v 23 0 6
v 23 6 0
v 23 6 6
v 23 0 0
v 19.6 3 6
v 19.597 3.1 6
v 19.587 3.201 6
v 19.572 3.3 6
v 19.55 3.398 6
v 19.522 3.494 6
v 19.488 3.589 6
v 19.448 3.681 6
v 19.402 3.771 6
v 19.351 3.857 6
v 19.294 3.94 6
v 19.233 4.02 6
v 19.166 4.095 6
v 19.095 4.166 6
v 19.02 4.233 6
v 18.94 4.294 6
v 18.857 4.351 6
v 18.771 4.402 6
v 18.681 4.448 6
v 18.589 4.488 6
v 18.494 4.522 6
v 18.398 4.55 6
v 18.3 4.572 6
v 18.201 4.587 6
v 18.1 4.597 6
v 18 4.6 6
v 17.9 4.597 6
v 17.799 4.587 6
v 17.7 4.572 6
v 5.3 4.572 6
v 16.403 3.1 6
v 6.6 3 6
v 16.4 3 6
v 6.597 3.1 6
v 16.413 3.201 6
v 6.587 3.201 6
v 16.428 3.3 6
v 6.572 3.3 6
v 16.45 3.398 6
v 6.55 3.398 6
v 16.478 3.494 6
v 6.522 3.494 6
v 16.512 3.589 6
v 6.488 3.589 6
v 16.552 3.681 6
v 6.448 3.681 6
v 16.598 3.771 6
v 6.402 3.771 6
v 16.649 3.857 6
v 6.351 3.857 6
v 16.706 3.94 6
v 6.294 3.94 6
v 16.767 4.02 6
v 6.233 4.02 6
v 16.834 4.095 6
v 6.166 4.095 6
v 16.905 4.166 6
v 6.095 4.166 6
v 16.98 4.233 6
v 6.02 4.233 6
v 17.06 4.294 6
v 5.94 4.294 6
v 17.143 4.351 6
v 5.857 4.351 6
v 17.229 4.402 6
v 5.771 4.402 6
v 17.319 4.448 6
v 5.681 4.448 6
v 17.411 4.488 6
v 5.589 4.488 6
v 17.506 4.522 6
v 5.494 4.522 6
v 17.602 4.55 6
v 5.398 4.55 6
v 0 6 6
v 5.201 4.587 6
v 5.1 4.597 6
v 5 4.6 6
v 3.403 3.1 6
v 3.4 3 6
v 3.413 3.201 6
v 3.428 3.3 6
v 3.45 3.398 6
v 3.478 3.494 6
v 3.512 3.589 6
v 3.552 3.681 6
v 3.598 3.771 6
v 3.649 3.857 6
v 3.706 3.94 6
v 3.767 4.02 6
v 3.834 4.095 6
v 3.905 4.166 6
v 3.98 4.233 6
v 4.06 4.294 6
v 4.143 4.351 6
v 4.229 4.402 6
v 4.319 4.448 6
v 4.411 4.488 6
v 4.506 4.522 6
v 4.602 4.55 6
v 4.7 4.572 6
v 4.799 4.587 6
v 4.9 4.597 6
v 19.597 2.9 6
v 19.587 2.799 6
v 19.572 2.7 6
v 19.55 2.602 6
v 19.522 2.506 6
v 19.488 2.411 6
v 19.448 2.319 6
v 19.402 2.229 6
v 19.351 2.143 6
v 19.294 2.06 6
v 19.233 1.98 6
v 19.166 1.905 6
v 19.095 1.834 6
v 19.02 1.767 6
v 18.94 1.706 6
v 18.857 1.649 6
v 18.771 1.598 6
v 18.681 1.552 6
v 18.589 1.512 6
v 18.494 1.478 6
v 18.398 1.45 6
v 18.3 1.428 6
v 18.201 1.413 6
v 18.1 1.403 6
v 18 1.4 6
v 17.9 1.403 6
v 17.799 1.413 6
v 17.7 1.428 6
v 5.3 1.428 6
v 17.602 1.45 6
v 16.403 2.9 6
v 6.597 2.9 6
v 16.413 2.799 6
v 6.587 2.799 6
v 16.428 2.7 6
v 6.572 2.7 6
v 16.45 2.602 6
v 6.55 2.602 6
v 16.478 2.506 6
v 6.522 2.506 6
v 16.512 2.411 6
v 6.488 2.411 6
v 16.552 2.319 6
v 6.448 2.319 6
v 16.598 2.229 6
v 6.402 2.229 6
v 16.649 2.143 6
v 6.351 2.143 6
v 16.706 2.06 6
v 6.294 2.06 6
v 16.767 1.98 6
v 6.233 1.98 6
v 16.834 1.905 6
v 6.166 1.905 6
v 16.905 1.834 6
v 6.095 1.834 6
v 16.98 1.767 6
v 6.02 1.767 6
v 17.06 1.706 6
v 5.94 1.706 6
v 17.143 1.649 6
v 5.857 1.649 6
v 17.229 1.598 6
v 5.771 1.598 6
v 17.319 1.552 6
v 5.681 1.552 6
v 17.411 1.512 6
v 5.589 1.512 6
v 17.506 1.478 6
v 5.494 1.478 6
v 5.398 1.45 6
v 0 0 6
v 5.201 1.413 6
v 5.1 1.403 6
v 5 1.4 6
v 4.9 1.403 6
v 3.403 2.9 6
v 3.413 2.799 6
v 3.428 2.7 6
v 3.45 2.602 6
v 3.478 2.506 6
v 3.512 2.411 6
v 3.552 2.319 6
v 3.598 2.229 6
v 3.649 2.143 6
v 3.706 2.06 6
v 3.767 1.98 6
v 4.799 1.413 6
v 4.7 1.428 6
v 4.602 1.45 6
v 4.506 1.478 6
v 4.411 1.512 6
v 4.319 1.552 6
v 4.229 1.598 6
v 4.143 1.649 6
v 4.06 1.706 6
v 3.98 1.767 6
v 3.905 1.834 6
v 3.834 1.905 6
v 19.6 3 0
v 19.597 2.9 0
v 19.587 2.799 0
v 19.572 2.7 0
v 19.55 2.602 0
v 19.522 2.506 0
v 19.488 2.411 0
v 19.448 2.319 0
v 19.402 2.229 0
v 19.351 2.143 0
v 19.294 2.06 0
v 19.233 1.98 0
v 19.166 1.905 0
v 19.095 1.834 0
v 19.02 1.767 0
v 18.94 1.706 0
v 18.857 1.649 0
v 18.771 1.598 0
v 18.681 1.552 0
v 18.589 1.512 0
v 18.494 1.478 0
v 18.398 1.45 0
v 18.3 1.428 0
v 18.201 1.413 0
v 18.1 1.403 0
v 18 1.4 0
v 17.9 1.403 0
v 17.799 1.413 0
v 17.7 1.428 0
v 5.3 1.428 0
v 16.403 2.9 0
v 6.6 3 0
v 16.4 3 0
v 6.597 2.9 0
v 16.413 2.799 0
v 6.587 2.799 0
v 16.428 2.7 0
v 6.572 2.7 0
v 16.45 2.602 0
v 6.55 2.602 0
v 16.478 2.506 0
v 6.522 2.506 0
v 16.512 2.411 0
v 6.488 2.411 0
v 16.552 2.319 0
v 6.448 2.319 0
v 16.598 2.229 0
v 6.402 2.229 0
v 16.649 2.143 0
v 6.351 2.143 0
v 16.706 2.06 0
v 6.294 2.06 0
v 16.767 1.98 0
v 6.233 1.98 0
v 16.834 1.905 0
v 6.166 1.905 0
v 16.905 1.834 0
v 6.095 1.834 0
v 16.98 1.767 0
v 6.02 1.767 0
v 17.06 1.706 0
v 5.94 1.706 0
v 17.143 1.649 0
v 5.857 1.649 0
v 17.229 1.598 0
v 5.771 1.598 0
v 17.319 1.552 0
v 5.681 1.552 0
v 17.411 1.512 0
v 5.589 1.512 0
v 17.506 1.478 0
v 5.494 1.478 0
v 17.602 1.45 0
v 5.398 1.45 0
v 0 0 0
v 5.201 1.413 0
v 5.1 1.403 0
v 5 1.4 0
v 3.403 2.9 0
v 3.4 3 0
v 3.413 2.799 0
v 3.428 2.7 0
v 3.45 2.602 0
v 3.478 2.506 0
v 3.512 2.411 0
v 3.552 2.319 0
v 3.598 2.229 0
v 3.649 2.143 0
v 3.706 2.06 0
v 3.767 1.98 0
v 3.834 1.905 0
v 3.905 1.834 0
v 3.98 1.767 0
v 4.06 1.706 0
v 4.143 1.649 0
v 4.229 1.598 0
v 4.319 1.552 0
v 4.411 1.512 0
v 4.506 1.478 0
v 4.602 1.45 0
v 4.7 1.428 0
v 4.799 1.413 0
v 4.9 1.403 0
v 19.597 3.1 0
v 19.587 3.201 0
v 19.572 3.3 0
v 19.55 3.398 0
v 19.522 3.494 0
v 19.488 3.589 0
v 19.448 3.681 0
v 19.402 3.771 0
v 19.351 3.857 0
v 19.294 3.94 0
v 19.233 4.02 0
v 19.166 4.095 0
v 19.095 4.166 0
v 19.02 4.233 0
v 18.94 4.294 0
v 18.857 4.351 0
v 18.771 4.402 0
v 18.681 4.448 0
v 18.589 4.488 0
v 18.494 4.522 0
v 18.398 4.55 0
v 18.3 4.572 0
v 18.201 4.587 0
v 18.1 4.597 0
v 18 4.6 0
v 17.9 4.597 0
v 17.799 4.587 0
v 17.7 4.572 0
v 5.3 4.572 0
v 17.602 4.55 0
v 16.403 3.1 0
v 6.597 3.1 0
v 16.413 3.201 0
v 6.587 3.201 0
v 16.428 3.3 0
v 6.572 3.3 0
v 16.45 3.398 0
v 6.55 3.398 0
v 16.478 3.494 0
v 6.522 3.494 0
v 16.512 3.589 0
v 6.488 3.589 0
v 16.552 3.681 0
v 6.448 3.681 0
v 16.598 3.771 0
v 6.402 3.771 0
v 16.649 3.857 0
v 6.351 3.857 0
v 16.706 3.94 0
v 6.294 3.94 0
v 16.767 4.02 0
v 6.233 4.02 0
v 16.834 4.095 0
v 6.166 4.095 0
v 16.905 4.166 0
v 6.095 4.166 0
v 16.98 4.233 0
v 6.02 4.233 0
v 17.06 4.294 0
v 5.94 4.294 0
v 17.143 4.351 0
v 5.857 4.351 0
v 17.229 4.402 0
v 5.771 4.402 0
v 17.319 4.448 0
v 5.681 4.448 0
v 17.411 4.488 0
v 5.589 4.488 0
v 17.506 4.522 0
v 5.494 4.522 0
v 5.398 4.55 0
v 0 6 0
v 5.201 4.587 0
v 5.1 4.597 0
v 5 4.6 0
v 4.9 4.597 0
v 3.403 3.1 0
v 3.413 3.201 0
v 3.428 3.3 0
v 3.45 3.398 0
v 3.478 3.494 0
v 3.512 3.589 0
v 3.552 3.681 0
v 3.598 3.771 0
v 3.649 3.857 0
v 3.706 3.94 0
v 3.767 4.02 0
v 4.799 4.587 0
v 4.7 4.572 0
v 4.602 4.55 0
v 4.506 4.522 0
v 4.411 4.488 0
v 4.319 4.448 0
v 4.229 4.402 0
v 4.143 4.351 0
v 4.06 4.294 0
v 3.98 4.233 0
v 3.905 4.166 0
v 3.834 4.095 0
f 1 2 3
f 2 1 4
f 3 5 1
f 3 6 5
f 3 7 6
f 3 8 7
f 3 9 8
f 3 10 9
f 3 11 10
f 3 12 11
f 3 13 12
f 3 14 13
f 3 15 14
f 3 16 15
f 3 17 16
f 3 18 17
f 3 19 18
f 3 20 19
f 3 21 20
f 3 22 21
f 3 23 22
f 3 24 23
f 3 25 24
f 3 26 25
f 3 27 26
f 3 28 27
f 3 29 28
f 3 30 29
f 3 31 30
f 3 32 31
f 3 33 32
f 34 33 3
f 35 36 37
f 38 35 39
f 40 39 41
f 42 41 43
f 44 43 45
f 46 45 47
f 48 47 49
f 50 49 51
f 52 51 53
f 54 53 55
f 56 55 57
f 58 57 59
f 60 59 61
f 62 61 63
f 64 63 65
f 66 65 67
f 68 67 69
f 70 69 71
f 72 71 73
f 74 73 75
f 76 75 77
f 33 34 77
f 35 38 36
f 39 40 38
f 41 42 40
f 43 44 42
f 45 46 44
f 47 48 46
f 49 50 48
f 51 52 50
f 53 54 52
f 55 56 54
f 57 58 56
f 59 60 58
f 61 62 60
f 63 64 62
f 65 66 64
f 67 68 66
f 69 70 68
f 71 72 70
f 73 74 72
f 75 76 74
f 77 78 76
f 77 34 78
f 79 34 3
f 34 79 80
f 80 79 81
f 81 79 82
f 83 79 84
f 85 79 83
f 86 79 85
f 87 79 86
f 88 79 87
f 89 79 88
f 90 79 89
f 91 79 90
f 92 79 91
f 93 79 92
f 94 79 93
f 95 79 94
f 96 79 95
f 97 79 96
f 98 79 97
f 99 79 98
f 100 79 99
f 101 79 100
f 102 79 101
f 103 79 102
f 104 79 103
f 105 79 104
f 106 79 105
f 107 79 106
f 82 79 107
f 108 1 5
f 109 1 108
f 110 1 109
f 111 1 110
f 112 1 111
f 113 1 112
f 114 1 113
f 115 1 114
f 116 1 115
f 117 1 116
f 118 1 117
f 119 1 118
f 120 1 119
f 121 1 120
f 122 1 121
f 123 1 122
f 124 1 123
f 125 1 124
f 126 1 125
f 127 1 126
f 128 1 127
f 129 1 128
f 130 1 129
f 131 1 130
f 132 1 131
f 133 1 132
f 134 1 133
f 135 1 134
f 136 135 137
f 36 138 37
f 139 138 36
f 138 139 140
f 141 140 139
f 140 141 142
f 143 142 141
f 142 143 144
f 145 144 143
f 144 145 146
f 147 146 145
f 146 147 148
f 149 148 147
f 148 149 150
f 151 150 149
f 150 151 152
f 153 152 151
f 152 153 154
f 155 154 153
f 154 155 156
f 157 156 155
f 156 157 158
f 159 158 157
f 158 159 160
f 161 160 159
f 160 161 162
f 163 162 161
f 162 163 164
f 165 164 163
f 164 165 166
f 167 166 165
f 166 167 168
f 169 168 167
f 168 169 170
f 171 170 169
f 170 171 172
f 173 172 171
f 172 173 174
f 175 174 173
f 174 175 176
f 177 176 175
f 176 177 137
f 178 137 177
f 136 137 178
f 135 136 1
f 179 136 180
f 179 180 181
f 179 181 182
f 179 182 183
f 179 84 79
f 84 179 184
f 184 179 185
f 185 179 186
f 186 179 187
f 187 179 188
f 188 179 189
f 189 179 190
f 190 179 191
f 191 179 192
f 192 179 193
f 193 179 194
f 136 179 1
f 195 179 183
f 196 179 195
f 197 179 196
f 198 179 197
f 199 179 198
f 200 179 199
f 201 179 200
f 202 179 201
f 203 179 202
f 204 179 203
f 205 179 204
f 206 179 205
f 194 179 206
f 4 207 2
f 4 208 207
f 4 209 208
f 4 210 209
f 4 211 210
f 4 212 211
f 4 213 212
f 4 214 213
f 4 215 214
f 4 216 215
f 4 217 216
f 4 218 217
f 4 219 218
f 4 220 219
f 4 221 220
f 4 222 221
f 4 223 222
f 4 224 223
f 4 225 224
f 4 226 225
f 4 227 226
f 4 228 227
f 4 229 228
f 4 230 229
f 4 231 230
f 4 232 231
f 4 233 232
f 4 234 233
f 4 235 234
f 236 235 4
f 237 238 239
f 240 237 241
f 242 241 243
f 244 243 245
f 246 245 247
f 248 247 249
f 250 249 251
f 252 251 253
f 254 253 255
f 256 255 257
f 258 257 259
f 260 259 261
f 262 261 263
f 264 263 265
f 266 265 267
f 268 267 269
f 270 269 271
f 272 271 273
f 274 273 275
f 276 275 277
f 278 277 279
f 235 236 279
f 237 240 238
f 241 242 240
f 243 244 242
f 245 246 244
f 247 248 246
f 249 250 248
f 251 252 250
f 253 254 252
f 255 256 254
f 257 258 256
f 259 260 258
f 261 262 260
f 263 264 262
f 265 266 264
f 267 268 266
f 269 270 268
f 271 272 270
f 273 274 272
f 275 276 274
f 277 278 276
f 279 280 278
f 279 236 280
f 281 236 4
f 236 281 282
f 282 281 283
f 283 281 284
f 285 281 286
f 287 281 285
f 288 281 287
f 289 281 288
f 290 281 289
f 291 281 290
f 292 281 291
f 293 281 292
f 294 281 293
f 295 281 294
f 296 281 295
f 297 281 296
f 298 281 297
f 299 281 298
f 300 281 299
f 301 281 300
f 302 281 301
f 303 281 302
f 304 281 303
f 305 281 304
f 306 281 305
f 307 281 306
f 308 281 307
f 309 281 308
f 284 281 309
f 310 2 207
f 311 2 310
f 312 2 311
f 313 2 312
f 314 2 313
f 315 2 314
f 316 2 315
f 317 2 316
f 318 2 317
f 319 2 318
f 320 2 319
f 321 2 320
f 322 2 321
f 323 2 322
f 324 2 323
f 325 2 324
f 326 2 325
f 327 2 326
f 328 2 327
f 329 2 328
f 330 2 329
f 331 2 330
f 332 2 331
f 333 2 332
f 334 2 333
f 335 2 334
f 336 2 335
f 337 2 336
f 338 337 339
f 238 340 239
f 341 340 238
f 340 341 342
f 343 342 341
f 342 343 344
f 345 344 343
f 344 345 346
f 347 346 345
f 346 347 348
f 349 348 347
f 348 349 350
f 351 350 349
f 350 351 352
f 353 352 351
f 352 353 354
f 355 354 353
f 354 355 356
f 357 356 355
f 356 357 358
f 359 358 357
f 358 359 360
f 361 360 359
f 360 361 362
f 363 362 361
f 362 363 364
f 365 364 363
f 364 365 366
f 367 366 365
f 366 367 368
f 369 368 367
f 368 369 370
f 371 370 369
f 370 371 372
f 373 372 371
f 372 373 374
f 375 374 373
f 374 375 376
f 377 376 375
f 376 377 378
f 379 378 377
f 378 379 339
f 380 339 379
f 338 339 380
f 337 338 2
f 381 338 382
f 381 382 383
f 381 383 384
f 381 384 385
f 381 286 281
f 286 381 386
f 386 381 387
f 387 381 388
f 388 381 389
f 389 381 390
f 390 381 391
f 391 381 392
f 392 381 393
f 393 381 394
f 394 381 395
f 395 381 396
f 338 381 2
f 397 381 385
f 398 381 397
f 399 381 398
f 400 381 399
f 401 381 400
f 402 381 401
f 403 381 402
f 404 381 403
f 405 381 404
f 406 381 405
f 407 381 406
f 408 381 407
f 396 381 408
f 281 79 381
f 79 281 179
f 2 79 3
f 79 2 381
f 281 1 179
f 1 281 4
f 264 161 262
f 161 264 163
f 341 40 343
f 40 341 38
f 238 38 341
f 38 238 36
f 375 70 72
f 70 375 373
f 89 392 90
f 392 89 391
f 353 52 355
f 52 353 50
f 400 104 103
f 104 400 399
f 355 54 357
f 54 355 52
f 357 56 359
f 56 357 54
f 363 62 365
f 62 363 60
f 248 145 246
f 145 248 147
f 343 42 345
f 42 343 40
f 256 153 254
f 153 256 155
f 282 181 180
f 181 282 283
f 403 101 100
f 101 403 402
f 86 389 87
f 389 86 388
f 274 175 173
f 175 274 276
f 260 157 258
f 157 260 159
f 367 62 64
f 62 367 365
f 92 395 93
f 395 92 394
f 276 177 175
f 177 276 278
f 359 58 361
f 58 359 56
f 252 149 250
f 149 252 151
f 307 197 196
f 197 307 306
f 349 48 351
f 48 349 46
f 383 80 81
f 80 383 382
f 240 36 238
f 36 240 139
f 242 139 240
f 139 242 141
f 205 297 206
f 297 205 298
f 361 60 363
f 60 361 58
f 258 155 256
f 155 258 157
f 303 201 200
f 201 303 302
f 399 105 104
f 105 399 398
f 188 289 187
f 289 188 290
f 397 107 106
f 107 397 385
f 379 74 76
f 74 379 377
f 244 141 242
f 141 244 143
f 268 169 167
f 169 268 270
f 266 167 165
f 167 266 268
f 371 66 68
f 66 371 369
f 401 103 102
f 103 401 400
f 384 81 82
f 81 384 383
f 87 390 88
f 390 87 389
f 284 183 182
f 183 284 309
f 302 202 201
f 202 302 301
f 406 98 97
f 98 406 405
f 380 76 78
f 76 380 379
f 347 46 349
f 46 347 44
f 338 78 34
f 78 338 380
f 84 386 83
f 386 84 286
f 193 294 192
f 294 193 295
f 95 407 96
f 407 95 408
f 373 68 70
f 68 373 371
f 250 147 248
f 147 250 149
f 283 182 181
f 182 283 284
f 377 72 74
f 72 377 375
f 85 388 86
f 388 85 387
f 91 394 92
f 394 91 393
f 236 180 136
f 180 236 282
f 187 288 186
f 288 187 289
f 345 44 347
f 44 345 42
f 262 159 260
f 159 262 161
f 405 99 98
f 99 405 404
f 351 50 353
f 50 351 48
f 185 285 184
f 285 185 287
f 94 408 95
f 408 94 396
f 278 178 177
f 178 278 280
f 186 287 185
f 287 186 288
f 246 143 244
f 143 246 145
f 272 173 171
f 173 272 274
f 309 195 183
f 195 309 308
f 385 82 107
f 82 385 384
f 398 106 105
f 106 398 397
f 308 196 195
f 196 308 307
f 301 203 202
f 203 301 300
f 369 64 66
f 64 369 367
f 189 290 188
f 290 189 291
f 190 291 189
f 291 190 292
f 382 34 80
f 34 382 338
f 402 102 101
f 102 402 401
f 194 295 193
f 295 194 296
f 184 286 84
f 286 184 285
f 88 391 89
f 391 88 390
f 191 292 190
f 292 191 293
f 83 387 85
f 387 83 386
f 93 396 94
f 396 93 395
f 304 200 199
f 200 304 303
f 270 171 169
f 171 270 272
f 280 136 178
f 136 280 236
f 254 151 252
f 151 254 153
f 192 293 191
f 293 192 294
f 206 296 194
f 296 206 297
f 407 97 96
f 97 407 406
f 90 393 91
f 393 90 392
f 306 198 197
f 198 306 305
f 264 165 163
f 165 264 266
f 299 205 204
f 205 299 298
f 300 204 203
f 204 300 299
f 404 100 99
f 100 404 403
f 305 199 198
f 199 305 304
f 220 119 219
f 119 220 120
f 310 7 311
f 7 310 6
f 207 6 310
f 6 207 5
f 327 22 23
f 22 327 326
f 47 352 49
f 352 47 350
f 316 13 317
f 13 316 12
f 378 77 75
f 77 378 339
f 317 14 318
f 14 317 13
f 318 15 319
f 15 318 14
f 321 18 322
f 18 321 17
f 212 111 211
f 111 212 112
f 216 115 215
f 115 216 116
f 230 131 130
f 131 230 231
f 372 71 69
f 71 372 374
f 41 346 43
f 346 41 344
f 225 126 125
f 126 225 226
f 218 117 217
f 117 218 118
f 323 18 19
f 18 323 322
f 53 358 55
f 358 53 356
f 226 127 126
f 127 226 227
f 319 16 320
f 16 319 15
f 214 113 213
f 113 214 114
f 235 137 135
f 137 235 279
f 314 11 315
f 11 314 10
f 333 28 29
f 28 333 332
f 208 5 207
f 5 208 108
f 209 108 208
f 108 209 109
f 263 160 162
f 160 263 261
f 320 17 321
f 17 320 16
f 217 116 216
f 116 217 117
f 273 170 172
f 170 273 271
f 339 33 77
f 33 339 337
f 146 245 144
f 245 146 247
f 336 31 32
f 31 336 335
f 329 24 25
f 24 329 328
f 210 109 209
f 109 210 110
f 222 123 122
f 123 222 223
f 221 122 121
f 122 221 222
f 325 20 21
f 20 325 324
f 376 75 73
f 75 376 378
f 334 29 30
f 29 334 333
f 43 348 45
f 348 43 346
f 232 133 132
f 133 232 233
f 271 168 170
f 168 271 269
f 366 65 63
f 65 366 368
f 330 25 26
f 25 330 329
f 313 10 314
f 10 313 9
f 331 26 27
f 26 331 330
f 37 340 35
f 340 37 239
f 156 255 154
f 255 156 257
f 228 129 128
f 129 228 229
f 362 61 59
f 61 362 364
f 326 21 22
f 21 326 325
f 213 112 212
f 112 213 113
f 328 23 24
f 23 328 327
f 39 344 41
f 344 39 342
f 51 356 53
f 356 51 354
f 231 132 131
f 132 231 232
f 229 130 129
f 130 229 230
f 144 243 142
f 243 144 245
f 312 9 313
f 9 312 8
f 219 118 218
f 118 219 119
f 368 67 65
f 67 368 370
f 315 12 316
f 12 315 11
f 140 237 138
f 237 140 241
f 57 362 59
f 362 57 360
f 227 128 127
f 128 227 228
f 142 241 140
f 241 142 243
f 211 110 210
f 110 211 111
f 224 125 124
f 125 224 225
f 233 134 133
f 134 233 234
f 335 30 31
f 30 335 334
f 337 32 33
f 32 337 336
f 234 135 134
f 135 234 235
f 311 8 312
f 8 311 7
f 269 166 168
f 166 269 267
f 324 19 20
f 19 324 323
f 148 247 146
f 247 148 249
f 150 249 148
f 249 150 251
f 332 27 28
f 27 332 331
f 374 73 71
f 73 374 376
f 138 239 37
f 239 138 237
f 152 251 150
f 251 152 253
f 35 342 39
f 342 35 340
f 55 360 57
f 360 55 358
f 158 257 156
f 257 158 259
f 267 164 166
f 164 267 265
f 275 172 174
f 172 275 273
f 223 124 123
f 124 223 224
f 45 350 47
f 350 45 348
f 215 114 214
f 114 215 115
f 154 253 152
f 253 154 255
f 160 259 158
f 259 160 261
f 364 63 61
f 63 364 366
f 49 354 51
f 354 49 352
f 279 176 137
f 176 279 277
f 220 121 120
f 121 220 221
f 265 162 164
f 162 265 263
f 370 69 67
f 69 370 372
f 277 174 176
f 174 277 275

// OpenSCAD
difference(){
    cube([23,6,6]);
    translate([5,3,-.10]) cylinder(r=1.6,h=9,$fn=100);
    translate([18,3,-.10]) cylinder(r=1.6,h=9,$fn=100);
}
